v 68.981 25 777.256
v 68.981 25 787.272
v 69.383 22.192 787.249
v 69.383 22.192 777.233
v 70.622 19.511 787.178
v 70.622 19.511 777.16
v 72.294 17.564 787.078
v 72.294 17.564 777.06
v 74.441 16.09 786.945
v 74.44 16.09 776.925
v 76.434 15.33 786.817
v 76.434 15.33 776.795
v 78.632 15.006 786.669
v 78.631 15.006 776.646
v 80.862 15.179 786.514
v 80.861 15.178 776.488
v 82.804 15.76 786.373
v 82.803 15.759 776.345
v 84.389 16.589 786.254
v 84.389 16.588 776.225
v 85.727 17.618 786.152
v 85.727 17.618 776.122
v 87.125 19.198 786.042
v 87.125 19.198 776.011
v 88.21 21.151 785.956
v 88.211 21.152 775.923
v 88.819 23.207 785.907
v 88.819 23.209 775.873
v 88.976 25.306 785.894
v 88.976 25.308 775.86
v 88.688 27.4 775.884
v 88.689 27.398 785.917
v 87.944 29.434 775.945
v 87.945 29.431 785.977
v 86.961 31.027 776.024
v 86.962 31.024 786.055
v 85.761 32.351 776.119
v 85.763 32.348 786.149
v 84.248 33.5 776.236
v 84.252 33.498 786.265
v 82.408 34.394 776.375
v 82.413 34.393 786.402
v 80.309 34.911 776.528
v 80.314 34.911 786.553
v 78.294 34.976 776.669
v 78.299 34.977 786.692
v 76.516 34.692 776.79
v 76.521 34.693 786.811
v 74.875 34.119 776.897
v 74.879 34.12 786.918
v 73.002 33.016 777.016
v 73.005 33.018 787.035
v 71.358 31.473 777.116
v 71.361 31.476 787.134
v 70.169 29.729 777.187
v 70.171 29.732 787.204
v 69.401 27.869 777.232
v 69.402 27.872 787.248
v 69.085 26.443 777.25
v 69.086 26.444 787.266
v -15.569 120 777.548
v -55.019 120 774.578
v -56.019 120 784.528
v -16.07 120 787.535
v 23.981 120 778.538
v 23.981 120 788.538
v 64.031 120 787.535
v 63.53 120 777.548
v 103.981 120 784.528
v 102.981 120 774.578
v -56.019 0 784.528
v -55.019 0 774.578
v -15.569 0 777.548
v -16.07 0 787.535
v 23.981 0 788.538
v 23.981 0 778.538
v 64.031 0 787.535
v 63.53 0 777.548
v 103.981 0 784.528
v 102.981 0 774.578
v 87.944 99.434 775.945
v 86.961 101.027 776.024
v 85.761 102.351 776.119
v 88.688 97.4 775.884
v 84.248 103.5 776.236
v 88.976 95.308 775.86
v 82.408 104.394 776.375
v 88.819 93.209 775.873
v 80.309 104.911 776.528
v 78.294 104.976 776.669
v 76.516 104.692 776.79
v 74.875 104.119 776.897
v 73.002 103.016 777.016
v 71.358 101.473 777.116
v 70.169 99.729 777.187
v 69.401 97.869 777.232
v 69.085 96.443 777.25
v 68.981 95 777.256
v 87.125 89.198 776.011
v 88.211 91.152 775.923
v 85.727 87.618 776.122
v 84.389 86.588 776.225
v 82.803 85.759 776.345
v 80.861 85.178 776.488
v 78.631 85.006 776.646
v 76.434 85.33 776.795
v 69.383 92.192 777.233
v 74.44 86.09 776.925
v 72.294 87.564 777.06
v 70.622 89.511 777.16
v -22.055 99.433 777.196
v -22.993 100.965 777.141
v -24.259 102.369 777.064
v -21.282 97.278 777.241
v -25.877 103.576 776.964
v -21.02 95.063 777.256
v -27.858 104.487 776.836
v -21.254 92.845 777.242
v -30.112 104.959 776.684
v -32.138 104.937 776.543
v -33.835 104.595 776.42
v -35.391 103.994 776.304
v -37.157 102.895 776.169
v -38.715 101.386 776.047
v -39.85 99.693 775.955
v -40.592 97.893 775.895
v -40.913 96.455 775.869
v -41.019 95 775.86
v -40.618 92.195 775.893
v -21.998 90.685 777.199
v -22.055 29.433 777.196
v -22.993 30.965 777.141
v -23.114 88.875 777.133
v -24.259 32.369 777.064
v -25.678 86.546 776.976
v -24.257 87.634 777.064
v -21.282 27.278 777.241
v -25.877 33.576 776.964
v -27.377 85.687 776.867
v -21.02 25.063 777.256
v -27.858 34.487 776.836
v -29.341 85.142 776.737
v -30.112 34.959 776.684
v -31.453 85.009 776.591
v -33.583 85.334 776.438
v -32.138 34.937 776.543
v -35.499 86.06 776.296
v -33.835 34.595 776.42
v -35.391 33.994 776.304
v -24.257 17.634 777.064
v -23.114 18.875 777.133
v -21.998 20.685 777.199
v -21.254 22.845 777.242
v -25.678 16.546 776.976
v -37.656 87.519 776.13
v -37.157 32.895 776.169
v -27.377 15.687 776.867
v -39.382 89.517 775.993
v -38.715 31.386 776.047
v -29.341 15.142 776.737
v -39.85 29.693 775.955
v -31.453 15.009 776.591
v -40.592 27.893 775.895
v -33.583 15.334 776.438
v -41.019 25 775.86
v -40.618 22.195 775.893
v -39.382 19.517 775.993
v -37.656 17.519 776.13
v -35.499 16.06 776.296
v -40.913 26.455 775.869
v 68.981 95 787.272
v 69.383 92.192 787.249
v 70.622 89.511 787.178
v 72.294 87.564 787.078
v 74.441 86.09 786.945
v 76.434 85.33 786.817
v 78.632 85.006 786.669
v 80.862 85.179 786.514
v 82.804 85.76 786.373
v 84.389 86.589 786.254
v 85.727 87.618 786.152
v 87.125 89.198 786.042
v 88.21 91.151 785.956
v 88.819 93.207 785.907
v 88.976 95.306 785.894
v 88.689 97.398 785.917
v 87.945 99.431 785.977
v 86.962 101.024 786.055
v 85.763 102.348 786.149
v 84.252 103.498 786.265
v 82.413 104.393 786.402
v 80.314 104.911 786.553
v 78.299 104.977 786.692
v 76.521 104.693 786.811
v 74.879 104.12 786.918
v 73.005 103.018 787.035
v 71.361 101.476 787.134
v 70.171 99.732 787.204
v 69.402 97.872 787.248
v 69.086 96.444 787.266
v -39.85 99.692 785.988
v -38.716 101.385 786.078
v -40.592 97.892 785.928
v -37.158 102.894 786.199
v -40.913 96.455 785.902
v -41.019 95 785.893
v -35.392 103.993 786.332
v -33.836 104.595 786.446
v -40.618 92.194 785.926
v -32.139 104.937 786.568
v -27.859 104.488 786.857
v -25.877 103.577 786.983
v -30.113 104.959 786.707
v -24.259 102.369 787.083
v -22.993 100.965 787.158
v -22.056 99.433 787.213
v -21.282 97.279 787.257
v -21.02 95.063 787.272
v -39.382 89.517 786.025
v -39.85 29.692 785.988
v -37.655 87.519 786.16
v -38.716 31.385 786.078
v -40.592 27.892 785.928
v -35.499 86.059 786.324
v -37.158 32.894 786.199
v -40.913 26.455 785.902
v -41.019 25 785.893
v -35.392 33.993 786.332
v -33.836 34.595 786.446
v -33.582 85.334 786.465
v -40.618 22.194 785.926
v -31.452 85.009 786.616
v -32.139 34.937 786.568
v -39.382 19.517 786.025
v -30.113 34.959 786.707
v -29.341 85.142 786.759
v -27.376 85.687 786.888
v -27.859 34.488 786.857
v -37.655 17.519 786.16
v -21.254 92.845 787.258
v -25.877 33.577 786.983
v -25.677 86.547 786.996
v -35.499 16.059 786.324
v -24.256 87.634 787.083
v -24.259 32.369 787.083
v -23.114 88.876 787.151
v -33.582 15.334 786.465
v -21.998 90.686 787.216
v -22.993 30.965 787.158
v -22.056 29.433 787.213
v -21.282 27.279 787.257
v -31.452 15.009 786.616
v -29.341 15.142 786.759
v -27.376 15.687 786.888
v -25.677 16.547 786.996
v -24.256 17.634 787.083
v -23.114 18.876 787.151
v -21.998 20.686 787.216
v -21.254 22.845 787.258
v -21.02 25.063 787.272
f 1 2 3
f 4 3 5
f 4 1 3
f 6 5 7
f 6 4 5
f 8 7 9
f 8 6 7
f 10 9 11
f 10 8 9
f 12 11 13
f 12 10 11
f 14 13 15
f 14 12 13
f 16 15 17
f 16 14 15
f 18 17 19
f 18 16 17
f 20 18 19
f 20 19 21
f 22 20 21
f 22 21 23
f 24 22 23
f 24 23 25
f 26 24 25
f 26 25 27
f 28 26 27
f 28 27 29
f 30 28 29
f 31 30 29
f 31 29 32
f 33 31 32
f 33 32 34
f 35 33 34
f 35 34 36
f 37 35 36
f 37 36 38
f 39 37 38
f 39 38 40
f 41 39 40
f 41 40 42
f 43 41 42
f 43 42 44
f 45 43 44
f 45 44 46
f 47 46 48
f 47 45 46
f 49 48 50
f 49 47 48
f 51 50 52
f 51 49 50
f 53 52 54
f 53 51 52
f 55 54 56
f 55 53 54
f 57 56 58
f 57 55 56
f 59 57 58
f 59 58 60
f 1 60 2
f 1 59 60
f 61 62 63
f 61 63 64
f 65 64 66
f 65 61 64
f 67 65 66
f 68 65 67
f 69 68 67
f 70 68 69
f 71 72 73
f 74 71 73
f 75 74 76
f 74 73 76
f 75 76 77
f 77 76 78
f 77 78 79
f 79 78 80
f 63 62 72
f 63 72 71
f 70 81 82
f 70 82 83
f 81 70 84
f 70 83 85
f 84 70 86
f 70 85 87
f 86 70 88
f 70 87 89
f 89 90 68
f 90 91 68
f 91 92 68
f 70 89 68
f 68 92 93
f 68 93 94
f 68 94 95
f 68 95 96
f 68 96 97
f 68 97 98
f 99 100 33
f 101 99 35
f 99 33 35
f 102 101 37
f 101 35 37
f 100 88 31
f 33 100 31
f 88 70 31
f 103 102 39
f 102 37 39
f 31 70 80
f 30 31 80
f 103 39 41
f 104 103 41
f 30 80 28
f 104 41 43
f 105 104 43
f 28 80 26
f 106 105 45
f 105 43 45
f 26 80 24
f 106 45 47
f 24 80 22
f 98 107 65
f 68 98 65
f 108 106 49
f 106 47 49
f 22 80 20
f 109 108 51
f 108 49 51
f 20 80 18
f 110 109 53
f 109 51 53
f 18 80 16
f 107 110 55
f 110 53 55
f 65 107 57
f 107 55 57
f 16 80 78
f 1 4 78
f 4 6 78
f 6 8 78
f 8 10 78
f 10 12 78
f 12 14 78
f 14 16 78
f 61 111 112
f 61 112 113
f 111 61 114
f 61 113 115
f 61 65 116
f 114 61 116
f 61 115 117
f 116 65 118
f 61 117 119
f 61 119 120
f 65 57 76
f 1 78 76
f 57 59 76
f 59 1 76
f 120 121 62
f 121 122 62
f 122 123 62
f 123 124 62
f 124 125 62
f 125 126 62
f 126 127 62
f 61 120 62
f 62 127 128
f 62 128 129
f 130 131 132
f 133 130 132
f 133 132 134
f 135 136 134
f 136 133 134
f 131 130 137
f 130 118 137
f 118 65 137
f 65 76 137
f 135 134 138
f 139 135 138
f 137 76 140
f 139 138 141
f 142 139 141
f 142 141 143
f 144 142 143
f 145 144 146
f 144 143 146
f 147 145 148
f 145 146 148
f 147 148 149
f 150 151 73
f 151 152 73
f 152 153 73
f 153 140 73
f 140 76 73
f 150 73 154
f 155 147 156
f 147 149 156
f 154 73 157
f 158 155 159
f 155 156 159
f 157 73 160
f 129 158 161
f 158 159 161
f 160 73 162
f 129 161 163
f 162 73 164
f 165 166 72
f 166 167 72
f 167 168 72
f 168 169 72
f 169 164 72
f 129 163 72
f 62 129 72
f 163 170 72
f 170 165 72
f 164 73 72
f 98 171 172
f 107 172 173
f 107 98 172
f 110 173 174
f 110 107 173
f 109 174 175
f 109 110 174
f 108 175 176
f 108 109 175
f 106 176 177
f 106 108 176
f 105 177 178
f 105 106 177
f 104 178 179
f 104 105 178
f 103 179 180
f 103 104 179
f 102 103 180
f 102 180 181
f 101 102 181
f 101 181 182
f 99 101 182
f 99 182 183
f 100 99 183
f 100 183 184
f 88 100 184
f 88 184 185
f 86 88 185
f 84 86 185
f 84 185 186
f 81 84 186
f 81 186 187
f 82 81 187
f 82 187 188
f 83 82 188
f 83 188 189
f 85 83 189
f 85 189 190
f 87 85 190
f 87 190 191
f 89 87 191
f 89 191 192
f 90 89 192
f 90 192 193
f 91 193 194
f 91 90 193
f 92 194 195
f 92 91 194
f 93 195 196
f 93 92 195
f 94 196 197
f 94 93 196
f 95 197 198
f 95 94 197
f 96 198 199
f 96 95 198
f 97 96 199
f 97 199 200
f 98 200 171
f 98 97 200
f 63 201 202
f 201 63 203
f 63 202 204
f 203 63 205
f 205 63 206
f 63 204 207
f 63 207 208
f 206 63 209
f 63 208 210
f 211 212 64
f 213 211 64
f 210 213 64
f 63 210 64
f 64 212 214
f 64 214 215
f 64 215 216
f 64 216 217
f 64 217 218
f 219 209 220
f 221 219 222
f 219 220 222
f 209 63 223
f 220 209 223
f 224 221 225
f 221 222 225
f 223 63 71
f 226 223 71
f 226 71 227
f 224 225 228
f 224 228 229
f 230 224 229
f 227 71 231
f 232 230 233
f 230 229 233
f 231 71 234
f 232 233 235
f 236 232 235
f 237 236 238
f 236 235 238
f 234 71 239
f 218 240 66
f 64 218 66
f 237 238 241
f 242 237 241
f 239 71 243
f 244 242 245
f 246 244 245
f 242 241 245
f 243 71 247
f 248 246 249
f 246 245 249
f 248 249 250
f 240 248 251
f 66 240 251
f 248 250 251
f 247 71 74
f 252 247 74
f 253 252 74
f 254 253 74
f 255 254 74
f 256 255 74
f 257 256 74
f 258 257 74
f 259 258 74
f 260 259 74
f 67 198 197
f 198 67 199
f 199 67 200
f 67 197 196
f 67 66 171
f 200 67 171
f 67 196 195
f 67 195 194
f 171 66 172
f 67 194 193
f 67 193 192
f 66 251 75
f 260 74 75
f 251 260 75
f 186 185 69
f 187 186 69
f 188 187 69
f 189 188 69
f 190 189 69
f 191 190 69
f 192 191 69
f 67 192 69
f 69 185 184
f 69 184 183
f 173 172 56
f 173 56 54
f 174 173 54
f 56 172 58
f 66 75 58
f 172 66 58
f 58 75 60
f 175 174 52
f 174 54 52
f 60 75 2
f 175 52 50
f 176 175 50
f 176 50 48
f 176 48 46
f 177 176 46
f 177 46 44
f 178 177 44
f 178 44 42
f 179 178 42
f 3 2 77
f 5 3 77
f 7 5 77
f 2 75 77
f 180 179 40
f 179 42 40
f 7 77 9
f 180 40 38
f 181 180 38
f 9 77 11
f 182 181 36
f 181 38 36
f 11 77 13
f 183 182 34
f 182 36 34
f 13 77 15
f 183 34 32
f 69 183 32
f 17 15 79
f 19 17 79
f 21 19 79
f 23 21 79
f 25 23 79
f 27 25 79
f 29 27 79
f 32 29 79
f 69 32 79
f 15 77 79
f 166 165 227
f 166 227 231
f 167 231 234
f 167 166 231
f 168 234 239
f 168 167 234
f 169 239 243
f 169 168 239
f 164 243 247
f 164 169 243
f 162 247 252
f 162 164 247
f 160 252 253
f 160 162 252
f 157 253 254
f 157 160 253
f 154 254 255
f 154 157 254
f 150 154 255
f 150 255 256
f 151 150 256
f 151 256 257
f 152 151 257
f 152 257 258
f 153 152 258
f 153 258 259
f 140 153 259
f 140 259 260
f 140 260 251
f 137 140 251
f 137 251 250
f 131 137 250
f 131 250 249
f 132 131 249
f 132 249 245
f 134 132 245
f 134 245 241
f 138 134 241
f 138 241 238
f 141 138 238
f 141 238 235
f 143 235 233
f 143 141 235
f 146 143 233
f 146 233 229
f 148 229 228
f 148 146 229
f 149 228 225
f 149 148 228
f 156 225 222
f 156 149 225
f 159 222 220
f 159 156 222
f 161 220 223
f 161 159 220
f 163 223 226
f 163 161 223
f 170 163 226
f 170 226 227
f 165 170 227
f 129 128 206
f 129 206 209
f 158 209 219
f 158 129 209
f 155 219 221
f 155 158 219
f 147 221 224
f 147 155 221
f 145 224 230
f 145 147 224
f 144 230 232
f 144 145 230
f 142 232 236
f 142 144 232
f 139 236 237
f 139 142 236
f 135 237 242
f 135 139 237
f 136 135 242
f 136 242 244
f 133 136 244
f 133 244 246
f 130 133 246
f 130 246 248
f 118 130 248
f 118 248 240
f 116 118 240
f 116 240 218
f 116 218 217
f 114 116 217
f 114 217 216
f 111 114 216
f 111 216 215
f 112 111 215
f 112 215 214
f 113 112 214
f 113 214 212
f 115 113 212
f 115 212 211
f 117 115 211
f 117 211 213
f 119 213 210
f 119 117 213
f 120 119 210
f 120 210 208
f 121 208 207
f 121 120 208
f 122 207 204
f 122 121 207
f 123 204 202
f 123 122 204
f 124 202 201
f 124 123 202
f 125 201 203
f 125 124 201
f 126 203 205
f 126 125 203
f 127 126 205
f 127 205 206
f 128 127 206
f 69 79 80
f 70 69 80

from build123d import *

# Parameters (mm, degrees)
BOSS_EXTRUDE1_DEPTH     = 120
CUT_EXTRUDE1_DEPTH      = 805.366061409
CUT_EXTRUDE1_DEPTH_BACK = 805.366061409
SKETCH2_R               = 10


with BuildPart() as part:
    # Sketch1 → Boss-Extrude1 (new body)
    with BuildSketch(Plane(origin=(0, 0, 0), x_dir=(1, 0, 0), z_dir=(0, 1, 0))):
        with BuildLine():
            Line((103.980664092, -784.528333178), (102.980664092, -774.578458807))
            ThreePointArc((102.980664092, -774.578458807), (23.980664092, -778.538383493), (-55.019335908, -774.578458807))
            Line((-55.019335908, -774.578458807), (-56.019335908, -784.528333178))
            ThreePointArc((-56.019335908, -784.528333178), (23.980664092, -788.538383493), (103.980664092, -784.528333178))
        make_face()
    extrude(amount=BOSS_EXTRUDE1_DEPTH)

    # Sketch2 → Cut-Extrude1 (cut, two sides: drawn at the far end of the back side and taken through both)
    with BuildSketch(Plane.XY.offset(-CUT_EXTRUDE1_DEPTH_BACK)):
        with Locations(Location((-31.019335908, 95, 0), (0, 0, 180))):
            Circle(SKETCH2_R)
        with Locations(Location((78.980664092, 95, 0), (0, 0, 180))):
            Circle(SKETCH2_R)
        with Locations(Location((78.980664092, 25, 0), (0, 0, 180))):
            Circle(SKETCH2_R)
        with Locations(Location((-31.019335908, 25, 0), (0, 0, 180))):
            Circle(SKETCH2_R)
    extrude(amount=CUT_EXTRUDE1_DEPTH + CUT_EXTRUDE1_DEPTH_BACK, mode=Mode.SUBTRACT)


solid = part.part
